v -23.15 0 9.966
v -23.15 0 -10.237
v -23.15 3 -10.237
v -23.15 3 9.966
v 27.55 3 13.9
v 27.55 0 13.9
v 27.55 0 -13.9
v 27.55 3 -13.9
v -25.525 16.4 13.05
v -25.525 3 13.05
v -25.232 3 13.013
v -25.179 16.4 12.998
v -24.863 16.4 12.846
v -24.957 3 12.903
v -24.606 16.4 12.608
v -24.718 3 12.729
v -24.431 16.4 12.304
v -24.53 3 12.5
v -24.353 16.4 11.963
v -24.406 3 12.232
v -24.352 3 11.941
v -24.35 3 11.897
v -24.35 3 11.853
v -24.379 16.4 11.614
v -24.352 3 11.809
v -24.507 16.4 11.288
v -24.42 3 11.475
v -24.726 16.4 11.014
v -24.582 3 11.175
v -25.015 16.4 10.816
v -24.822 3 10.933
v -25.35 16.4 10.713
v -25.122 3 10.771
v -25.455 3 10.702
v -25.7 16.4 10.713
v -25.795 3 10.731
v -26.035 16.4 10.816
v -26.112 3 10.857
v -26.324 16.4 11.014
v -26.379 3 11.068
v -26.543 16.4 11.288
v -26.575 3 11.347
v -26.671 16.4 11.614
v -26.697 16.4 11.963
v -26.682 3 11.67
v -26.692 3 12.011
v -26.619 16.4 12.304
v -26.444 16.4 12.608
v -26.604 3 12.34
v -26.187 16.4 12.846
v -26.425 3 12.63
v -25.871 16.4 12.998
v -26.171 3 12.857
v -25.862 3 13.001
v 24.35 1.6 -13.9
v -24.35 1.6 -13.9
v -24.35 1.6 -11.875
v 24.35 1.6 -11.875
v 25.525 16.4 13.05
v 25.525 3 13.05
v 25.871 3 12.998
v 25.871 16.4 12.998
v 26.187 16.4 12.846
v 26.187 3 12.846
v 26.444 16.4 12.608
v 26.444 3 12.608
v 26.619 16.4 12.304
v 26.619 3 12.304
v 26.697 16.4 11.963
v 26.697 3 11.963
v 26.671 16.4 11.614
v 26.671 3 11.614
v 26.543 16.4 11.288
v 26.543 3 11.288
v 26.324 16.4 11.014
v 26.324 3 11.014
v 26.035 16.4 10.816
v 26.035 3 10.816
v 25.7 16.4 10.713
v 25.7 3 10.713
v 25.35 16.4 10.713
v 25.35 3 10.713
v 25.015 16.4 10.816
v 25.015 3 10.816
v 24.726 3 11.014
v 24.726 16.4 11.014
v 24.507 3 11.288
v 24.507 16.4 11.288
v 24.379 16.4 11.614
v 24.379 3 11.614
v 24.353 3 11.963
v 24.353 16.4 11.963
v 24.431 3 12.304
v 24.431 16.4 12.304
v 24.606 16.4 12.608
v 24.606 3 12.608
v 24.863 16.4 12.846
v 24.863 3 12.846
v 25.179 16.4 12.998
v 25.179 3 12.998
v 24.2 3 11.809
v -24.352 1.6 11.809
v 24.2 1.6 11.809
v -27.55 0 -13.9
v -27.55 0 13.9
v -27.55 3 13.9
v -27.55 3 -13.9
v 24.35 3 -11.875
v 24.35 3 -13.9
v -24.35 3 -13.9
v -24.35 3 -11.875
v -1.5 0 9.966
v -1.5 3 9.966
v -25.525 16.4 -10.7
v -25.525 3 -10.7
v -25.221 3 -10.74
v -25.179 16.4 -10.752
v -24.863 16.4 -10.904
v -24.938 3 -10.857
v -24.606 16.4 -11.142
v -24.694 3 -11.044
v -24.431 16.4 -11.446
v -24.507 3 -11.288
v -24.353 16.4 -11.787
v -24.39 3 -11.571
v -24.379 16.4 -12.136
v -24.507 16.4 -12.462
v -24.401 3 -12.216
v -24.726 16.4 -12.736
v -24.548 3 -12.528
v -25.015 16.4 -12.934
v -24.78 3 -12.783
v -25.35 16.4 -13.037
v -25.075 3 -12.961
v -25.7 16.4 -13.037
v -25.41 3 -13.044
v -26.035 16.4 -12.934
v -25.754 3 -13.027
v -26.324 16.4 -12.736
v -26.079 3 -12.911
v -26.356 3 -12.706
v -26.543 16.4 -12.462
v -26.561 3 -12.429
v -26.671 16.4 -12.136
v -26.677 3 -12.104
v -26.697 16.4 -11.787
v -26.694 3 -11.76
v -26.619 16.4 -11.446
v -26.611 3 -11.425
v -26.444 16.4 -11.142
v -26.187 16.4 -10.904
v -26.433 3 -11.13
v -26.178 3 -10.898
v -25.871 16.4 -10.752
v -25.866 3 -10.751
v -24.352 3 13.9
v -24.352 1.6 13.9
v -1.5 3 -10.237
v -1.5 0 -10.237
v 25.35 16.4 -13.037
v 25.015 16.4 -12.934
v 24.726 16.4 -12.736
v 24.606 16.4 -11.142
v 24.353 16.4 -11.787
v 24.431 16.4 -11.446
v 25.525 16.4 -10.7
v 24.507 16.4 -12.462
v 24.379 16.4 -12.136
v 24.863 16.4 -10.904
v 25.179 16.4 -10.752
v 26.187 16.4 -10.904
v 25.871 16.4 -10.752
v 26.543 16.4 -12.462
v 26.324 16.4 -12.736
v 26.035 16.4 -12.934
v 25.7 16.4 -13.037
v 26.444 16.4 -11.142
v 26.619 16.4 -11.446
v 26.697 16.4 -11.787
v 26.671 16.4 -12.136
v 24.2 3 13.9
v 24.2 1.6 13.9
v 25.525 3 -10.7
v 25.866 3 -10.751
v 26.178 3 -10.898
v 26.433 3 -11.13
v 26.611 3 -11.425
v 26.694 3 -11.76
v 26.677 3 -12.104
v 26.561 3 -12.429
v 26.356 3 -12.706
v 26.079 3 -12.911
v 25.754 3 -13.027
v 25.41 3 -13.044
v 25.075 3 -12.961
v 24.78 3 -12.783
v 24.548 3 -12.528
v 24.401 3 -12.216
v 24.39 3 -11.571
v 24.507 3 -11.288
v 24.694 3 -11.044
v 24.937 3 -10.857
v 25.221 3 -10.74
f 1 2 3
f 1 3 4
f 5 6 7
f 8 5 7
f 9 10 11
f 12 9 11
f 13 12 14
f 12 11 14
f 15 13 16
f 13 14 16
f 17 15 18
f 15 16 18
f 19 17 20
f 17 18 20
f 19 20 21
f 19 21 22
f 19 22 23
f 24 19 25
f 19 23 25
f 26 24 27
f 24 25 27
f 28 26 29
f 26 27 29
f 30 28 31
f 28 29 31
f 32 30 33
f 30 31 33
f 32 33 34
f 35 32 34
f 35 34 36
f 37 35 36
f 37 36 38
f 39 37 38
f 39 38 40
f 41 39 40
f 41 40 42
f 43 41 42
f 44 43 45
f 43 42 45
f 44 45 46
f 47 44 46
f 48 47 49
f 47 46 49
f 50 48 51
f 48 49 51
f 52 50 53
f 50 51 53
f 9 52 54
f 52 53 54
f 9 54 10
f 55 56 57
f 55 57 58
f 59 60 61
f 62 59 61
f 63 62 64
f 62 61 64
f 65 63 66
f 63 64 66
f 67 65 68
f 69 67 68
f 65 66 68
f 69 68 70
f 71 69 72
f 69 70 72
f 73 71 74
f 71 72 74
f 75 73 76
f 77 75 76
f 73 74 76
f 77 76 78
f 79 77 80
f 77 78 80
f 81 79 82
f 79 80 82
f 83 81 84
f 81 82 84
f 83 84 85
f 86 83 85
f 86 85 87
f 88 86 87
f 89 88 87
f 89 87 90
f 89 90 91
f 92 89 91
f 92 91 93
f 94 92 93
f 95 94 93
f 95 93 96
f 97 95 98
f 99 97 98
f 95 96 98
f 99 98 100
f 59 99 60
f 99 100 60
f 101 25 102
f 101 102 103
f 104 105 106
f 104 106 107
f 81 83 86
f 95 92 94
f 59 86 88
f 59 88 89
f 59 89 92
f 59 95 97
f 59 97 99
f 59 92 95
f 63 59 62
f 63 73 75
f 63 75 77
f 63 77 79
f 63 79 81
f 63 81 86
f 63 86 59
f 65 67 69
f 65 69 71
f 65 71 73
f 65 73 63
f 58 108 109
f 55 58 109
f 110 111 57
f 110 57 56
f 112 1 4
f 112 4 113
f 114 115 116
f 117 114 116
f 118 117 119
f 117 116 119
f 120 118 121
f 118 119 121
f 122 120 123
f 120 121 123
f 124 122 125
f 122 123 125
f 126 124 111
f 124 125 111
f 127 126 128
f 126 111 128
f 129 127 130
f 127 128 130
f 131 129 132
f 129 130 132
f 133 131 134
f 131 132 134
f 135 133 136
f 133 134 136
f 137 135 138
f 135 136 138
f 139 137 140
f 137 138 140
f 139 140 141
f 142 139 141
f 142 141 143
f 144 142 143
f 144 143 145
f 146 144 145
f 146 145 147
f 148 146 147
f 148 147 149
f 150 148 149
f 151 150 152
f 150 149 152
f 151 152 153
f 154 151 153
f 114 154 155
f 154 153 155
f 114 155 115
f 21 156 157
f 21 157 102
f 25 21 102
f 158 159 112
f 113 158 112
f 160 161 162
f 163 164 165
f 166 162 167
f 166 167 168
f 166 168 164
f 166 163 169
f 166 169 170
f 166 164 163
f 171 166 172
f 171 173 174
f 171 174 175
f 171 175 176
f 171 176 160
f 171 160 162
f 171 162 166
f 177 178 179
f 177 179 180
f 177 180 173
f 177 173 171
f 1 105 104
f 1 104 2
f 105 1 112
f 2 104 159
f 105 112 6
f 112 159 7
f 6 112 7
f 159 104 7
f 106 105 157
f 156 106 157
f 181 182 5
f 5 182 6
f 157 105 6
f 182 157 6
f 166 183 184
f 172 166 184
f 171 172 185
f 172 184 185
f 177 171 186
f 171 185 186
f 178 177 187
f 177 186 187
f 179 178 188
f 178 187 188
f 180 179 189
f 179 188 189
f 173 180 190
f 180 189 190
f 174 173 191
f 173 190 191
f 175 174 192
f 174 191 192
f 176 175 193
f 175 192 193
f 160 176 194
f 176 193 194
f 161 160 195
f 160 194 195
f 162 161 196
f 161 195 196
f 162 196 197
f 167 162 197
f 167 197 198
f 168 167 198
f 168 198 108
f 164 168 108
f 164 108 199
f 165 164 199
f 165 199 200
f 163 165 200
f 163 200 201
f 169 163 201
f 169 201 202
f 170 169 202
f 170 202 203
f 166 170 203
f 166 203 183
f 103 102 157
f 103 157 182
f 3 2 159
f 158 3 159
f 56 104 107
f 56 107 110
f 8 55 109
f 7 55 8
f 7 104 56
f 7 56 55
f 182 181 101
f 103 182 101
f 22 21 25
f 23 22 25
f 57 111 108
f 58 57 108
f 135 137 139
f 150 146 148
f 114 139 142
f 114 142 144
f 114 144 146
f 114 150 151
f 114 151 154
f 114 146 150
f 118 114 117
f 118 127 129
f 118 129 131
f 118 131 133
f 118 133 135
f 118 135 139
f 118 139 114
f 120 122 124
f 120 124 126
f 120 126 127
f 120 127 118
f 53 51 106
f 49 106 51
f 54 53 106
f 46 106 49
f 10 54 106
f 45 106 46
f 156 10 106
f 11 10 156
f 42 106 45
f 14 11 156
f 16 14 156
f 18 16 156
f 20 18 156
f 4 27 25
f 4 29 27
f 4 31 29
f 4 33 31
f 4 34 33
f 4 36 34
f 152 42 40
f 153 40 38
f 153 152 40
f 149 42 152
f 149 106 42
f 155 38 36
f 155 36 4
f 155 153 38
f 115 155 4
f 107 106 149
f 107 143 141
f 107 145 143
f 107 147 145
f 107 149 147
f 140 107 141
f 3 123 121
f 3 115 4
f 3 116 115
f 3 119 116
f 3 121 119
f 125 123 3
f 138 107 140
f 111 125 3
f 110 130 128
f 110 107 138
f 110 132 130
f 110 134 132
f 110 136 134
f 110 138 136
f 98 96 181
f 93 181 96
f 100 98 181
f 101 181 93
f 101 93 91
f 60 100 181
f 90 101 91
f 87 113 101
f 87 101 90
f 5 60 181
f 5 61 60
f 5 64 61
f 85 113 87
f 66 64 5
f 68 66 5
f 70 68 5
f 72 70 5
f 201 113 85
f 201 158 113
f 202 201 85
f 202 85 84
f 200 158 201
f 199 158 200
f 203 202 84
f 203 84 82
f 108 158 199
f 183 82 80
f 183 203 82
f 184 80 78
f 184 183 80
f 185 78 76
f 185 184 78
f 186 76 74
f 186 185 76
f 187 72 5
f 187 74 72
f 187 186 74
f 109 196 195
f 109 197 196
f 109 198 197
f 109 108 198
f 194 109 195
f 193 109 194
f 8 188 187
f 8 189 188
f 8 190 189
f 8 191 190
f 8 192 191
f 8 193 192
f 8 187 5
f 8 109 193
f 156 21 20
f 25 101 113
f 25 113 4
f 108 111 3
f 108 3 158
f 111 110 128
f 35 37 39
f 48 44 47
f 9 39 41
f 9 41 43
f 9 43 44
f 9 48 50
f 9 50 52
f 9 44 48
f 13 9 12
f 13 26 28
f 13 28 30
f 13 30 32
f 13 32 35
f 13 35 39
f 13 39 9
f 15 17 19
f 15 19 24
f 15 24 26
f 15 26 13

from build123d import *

# Parameters (mm, degrees)
SKETCH1_W           = 55.1
SKETCH1_H           = 27.8
BOSS_EXTRUDE1_DEPTH = 3
SKETCH2_R           = 1.175
BOSS_EXTRUDE2_DEPTH = 13.4
SKETCH3_W           = 21.65
SKETCH3_H           = 20.203759547
SKETCH3_W_2         = 17.65
SKETCH3_H_2         = 15.75
CUT_EXTRUDE1_DEPTH  = 35.945278651
SKETCH6_W           = 48.551877831
SKETCH6_H           = 2.091403142
SKETCH6_W_2         = 48.7
SKETCH6_H_2         = 4.58395526
CUT_EXTRUDE2_DEPTH  = 1.4


with BuildPart() as part:
    # Sketch1 → Boss-Extrude1 (new body)
    with BuildSketch(Plane(origin=(0, 0, 0), x_dir=(1, 0, 0), z_dir=(0, 1, 0))):
        Rectangle(SKETCH1_W, SKETCH1_H)
    extrude(amount=BOSS_EXTRUDE1_DEPTH)

    # Sketch2 → Boss-Extrude2 (add)
    with BuildSketch(Plane(origin=(0, 3, 0), x_dir=(1, 0, 0), z_dir=(0, 1, 0))):
        with Locations(Location((-25.525, 11.875, 0), (0, 0, 270))):
            Circle(SKETCH2_R)
        with Locations(Location((-25.525, -11.875, 0), (0, 0, 270))):
            Circle(SKETCH2_R)
        with Locations(Location((25.525, 11.875, 0), (0, 0, 270))):
            Circle(SKETCH2_R)
        with Locations(Location((25.525, -11.875, 0), (0, 0, 270))):
            Circle(SKETCH2_R)
    extrude(amount=BOSS_EXTRUDE2_DEPTH)

    # Sketch3 → Cut-Extrude1 (cut, through all)
    # profile 1 of 2: a face of its own
    with BuildSketch(Plane.XZ):
        with Locations((-12.325, -0.13539581)):
            Rectangle(SKETCH3_W, SKETCH3_H)
        with Locations((-12.325, -0.375)):
            Rectangle(SKETCH3_W_2, SKETCH3_H_2, mode=Mode.SUBTRACT)
    # profile 2 of 2: a face of its own
    with BuildSketch(Plane.XZ):
        with Locations((-12.325, -0.375)):
            Rectangle(SKETCH3_W_2, SKETCH3_H_2)
    extrude(amount=-CUT_EXTRUDE1_DEPTH, mode=Mode.SUBTRACT)

    # Sketch6 → Cut-Extrude2 (cut)
    with BuildSketch(Plane(origin=(0, 3, 0), x_dir=(1, 0, 0), z_dir=(0, 1, 0))):
        with Locations((-0.075938916, -12.854298429)):
            Rectangle(SKETCH6_W, SKETCH6_H)
        with Locations((0, 14.16697763)):
            Rectangle(SKETCH6_W_2, SKETCH6_H_2)
    extrude(amount=-CUT_EXTRUDE2_DEPTH, mode=Mode.SUBTRACT)


solid = part.part
